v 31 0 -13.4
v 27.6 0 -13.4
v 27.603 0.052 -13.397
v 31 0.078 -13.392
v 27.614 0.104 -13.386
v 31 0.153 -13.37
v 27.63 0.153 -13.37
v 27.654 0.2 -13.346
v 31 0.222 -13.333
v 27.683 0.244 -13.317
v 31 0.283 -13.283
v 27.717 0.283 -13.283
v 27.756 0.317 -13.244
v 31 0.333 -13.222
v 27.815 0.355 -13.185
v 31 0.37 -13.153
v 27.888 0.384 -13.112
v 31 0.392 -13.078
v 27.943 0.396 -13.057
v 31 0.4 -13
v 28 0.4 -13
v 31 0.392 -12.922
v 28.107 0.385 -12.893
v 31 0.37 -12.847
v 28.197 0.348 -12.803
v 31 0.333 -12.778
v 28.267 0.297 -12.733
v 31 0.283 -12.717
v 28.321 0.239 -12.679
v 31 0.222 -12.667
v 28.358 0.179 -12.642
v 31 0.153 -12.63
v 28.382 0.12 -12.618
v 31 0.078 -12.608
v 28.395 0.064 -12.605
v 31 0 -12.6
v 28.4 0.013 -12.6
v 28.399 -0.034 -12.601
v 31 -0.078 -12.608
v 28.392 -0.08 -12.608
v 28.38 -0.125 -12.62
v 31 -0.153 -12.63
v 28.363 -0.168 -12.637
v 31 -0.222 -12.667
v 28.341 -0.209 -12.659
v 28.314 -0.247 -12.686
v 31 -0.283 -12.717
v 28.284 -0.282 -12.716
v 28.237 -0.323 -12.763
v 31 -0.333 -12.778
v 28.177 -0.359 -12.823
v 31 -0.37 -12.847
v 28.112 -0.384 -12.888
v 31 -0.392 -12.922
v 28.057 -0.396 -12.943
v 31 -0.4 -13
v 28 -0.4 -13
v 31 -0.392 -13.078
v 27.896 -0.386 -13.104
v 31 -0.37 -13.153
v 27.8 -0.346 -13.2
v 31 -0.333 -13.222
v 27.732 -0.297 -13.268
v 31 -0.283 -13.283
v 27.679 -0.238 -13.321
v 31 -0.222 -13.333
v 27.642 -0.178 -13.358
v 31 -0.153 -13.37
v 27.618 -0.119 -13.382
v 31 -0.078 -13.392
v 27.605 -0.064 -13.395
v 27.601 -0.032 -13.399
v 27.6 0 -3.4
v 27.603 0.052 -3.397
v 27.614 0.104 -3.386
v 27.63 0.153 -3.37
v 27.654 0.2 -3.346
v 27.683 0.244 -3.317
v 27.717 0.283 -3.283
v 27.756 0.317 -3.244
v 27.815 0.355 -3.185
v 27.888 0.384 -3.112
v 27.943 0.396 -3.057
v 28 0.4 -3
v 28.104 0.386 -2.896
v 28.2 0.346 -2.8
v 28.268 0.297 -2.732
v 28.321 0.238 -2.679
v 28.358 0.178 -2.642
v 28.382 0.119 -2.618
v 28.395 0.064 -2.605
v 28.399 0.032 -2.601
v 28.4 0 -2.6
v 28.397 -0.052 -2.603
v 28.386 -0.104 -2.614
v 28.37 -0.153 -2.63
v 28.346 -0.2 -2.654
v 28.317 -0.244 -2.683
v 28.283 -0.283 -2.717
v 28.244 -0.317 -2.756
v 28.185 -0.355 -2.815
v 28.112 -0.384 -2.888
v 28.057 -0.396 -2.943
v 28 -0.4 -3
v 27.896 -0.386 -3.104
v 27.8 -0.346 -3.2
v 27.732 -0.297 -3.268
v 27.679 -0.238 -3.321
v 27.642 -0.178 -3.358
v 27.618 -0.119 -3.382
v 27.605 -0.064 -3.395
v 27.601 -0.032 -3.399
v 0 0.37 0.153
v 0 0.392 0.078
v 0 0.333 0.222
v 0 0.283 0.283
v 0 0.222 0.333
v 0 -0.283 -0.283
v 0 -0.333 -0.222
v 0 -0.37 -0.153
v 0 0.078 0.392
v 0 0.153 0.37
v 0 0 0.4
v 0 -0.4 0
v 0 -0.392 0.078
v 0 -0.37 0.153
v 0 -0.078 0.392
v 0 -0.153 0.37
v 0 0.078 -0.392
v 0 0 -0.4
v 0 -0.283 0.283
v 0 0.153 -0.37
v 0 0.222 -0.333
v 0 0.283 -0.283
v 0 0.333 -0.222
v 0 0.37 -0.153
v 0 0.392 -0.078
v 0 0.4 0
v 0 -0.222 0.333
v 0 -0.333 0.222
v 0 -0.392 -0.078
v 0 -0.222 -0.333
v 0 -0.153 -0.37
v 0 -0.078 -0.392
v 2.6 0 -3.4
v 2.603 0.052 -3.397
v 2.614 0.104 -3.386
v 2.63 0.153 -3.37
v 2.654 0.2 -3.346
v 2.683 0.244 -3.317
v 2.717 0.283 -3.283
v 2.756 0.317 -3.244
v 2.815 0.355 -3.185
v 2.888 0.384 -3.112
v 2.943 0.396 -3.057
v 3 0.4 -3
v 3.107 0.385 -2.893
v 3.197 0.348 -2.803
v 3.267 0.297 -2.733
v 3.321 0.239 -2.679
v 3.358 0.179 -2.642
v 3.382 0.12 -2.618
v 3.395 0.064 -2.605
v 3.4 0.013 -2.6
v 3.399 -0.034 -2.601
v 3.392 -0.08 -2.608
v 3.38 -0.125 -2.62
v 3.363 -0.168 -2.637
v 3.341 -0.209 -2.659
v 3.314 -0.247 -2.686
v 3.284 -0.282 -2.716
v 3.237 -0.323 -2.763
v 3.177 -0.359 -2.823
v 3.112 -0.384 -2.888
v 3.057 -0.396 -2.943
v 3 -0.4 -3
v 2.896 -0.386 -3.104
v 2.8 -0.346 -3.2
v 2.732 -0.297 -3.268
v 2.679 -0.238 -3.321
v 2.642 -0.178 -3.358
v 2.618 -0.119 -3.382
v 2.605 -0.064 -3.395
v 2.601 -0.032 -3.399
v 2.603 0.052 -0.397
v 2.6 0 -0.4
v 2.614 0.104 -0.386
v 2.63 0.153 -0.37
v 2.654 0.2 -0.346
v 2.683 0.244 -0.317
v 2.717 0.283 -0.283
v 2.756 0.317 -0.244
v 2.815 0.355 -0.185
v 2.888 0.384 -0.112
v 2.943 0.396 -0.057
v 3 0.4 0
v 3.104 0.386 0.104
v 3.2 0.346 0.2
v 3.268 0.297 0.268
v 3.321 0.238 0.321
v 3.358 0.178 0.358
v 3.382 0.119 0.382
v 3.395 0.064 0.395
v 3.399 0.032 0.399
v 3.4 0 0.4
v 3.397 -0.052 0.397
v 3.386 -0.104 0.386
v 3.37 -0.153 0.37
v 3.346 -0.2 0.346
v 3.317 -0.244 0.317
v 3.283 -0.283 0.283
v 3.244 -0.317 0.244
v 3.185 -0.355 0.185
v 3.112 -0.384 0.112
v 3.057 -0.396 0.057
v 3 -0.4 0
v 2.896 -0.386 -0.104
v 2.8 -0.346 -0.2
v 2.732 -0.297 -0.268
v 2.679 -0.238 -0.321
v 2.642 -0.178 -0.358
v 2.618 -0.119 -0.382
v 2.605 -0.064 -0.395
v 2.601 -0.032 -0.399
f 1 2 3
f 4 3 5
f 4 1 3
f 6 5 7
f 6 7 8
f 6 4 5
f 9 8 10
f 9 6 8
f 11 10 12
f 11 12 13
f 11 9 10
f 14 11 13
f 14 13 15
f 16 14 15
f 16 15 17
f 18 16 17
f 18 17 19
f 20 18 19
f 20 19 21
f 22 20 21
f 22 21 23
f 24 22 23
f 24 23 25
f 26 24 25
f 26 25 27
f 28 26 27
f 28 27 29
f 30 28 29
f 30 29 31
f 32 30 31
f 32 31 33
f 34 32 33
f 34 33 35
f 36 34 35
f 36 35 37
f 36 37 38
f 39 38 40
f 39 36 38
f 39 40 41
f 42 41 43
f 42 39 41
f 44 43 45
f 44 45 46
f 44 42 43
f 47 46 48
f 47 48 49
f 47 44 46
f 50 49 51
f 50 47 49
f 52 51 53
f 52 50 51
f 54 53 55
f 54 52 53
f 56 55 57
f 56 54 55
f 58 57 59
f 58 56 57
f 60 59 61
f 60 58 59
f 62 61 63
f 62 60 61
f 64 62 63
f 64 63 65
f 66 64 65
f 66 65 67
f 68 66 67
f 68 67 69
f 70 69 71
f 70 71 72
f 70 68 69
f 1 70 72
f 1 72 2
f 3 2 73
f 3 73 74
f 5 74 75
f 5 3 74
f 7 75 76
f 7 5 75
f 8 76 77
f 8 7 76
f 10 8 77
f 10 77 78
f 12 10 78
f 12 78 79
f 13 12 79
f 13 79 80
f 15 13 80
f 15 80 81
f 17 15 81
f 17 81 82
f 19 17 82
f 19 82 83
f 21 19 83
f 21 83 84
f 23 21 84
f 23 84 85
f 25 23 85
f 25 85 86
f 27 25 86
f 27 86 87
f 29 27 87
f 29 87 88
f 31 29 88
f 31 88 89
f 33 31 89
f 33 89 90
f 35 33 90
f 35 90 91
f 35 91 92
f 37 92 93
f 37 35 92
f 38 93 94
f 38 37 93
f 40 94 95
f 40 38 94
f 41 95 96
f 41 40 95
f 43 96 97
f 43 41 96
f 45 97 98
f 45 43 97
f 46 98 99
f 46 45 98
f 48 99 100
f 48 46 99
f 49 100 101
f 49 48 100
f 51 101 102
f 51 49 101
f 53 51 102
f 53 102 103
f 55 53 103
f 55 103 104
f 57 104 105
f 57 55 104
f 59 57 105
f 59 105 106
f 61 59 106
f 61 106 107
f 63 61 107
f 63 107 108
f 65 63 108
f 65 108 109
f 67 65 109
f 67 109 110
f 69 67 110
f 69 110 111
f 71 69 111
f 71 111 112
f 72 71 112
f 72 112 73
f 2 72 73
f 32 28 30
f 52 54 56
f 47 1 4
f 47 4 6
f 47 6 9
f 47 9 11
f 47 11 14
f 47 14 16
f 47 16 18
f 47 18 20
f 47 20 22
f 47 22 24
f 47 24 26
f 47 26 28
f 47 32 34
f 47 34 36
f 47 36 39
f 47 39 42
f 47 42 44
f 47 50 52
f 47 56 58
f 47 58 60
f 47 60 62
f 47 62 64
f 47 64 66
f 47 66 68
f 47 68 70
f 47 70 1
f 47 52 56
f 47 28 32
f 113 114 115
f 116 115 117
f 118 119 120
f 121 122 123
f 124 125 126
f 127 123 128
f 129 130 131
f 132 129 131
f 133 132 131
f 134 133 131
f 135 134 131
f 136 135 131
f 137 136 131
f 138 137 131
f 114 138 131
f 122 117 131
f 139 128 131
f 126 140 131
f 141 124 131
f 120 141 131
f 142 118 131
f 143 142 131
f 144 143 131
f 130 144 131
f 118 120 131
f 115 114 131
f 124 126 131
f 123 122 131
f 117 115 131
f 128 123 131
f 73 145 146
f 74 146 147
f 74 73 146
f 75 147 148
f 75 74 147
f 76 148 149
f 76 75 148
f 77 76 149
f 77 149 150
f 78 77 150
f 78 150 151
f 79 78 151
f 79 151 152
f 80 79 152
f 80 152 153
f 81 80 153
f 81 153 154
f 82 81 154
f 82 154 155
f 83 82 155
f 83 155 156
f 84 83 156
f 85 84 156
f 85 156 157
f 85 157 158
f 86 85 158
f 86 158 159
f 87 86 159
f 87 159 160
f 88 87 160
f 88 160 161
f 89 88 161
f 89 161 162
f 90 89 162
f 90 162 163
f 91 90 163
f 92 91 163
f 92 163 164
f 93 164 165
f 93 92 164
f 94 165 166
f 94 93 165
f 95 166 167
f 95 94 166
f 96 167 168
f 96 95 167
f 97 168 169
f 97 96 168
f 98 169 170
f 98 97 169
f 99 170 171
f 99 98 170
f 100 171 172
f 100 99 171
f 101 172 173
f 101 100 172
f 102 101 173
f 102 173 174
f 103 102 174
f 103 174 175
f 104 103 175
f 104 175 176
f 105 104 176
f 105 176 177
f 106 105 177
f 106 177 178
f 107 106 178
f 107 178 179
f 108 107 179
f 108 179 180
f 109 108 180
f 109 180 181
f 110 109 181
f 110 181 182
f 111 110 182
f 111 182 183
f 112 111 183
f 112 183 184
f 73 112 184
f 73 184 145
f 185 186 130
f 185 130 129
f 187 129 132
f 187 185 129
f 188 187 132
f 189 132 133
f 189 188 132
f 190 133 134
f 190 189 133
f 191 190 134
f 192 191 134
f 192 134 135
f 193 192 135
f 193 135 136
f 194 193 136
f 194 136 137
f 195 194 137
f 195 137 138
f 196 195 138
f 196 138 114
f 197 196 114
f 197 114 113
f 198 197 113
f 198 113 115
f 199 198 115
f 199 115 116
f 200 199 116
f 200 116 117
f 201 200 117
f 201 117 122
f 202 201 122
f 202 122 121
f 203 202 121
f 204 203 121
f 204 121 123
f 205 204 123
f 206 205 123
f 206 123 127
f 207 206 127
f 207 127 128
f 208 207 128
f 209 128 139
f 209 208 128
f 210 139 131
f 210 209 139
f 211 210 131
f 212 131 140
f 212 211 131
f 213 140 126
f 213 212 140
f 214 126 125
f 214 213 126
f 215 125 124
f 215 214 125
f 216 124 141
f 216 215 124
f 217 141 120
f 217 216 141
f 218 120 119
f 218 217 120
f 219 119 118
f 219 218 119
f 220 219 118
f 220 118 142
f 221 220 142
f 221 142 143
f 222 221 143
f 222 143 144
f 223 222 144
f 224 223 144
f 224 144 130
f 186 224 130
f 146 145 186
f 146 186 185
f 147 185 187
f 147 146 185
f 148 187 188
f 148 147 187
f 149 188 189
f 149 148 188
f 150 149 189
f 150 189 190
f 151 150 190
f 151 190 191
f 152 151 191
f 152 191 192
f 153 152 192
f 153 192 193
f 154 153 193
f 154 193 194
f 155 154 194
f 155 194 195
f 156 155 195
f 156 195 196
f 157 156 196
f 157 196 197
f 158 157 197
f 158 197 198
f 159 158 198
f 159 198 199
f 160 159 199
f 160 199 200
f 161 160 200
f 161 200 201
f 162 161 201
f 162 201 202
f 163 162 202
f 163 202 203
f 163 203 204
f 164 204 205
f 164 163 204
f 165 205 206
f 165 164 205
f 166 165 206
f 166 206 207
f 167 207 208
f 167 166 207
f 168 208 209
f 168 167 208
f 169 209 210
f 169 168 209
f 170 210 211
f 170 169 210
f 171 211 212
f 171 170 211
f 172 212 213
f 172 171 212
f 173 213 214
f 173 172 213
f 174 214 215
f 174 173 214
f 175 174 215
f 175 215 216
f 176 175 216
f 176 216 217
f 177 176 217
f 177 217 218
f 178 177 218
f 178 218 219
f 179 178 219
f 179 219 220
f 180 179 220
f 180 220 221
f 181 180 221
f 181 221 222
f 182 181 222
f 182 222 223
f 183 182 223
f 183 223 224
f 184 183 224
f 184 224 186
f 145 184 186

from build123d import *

# Parameters (mm, degrees)
SKETCH2_R = 0.4


with BuildPart() as part:
    # Sweep1: sweep along a path in Sketch1
    with BuildLine(Plane(origin=(0, 0, 0), x_dir=(1, 0, 0), z_dir=(0, 1, 0))) as sweep1_path:
        Line((0, 0), (3, 0))
        Line((3, 0), (3, 3))
        Line((3, 3), (28, 3))
        Line((28, 3), (28, 13))
        Line((28, 13), (31, 13))
    # Sketch2 → Sweep1 (sweep)
    with BuildSketch(Plane(origin=(0, 0, 0), x_dir=(0, 0, -1), z_dir=(1, 0, 0))):
        Circle(SKETCH2_R)
    sweep(path=sweep1_path.line, transition=Transition.RIGHT)


solid = part.part
